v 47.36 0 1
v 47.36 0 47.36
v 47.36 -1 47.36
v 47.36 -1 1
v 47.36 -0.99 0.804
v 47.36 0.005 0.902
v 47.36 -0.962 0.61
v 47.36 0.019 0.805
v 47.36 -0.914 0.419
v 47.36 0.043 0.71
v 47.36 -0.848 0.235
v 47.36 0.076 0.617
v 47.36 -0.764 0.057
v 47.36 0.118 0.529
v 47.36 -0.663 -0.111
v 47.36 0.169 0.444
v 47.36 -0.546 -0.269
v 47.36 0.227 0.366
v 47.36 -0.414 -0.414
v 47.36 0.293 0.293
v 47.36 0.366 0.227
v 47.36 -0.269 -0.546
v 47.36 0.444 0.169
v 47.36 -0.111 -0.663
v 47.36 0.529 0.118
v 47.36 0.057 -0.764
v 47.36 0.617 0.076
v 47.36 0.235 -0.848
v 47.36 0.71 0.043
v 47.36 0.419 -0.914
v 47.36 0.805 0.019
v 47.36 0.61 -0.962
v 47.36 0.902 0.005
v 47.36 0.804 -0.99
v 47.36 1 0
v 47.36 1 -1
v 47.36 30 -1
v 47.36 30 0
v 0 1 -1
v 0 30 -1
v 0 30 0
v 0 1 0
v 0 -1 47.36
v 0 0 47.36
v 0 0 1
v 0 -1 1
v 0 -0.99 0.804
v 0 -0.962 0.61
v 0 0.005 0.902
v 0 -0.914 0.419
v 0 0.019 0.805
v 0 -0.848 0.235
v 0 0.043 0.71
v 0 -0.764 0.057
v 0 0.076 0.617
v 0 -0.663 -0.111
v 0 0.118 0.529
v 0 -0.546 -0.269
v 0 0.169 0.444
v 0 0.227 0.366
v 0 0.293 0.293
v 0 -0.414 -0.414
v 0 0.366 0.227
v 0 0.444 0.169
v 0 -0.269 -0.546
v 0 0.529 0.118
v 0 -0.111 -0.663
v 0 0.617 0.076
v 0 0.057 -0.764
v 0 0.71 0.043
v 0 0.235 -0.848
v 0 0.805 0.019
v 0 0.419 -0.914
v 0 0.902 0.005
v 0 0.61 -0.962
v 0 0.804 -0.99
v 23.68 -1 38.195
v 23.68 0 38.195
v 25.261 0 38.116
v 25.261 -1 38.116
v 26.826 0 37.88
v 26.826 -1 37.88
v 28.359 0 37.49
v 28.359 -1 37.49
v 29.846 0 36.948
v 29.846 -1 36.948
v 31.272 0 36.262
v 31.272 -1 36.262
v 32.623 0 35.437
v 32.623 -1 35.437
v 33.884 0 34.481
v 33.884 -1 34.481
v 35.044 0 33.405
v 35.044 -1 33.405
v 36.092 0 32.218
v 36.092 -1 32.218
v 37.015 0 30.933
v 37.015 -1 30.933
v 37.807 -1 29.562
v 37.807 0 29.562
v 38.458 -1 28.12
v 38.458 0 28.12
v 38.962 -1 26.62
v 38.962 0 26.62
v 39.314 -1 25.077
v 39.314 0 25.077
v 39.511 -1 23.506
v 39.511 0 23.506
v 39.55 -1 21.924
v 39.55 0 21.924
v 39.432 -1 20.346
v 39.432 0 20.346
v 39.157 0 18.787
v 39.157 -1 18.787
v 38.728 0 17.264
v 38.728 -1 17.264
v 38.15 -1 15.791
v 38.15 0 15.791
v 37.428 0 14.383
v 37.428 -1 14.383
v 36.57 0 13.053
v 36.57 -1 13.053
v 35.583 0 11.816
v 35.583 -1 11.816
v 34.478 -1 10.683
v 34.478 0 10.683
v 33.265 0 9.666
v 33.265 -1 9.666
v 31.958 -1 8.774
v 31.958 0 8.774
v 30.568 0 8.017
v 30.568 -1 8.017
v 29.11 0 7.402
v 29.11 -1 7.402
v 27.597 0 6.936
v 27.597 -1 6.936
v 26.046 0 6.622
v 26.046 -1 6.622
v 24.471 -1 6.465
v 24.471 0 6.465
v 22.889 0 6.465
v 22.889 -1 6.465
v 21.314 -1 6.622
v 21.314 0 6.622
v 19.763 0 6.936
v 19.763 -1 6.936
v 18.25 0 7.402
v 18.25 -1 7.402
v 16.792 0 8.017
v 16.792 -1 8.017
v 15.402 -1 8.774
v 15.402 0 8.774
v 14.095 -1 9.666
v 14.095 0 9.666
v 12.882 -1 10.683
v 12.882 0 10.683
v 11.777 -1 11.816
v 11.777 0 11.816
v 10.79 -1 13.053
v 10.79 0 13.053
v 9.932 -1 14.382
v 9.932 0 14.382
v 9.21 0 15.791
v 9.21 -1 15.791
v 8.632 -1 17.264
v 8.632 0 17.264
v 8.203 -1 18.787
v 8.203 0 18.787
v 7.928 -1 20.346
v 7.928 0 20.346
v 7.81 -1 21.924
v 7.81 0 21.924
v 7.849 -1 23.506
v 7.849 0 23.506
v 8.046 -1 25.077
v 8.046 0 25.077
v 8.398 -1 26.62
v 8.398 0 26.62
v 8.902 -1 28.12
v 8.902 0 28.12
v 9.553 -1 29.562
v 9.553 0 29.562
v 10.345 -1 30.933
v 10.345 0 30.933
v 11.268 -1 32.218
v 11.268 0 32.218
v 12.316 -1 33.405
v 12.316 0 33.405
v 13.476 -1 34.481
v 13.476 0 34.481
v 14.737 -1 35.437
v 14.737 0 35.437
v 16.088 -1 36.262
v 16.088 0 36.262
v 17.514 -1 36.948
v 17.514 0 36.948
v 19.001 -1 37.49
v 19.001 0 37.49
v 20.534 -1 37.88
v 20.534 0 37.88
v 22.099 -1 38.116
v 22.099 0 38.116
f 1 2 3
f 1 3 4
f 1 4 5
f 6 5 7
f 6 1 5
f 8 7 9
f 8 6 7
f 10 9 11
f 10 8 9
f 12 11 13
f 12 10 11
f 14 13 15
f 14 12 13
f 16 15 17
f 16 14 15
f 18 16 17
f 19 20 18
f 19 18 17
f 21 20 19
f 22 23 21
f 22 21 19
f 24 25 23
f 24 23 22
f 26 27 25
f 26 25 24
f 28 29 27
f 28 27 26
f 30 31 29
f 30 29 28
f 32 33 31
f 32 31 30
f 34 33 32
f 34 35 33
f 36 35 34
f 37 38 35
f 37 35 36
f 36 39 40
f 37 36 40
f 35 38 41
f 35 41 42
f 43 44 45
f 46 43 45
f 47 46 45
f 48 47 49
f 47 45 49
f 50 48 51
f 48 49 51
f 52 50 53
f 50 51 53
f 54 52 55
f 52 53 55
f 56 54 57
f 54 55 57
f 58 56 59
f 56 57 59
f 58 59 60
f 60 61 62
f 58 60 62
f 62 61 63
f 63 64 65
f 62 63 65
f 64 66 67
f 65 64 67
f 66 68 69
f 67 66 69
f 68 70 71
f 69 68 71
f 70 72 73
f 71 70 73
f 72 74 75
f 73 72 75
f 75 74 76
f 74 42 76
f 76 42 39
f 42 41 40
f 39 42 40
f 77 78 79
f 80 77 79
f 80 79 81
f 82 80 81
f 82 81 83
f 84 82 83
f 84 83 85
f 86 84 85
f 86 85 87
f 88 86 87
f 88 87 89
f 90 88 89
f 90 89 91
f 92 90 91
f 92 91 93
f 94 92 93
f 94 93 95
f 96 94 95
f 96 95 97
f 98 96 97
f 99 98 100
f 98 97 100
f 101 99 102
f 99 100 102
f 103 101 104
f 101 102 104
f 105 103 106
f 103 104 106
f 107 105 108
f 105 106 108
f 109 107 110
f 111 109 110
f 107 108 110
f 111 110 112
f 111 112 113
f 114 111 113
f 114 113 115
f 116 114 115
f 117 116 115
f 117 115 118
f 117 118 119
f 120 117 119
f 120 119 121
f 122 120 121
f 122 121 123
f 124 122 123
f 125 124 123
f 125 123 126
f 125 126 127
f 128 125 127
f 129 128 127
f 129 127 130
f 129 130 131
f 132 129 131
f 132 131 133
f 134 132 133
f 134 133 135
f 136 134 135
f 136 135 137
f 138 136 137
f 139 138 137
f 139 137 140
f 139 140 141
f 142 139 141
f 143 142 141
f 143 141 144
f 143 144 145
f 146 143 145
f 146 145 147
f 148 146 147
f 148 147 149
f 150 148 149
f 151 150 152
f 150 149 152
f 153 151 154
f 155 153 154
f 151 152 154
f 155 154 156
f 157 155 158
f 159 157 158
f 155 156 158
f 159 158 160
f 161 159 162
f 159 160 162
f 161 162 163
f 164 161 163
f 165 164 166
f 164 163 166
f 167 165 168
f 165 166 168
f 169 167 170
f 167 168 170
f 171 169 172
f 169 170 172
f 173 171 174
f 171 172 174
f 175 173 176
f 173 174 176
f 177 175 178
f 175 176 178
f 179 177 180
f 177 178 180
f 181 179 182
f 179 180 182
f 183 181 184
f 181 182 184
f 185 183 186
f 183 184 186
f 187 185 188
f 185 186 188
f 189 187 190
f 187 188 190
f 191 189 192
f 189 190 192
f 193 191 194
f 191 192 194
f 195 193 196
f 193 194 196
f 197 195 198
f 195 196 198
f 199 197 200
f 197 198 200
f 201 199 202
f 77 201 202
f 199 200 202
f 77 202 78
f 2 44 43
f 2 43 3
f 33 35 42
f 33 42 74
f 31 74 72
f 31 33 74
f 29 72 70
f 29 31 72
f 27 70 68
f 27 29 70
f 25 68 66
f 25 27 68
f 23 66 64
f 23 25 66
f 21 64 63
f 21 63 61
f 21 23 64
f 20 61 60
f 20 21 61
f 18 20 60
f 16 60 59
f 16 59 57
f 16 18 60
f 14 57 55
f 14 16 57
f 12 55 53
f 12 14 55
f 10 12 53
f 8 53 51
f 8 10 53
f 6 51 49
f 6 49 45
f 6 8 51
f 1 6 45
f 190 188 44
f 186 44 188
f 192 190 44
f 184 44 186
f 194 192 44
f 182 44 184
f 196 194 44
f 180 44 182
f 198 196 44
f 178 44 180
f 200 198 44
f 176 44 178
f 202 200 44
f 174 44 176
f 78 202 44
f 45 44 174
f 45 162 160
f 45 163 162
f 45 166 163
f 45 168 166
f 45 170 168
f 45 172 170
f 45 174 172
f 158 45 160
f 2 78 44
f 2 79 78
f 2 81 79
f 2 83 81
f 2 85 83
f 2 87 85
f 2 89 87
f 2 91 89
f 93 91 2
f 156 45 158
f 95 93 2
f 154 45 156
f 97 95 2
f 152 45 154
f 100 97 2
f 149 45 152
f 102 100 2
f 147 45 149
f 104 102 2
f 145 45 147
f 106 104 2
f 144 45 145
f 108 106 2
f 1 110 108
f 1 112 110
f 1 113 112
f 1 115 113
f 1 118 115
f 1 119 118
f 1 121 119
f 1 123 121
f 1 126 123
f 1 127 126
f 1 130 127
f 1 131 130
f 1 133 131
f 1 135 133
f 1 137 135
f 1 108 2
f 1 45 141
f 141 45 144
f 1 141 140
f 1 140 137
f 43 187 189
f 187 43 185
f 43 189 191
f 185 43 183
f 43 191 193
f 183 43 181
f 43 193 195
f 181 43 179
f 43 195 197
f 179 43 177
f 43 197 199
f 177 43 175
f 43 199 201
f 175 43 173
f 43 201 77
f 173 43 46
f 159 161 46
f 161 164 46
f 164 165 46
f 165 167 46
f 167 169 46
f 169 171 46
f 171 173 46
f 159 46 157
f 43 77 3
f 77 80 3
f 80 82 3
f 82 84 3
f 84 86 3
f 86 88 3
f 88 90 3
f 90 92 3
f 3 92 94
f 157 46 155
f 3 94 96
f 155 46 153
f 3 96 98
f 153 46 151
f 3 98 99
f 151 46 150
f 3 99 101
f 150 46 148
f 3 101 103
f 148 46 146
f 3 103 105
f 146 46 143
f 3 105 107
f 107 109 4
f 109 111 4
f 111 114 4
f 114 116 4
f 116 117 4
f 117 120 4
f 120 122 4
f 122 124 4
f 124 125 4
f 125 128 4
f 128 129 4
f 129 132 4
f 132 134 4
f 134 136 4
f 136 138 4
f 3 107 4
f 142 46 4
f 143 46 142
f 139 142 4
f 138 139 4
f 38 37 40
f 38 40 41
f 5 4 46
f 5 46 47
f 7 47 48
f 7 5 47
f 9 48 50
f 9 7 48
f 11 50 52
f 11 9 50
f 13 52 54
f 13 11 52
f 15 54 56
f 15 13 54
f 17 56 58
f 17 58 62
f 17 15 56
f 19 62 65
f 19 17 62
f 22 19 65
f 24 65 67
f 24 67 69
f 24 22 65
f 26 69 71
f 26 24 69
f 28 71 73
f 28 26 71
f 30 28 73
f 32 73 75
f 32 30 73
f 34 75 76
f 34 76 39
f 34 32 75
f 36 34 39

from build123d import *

# Parameters (mm, degrees)
SKETCH10_W                   = 47.36
SKETCH10_H                   = 47.36
BASE_FLANGE1_DEPTH           = 1
EDGE_FLANGE1_STRIP_W         = 6
EDGE_FLANGE1_STRIP_H         = 1
EDGE_FLANGE1_STRIP_CUT_DEPTH = 47.36
EDGE_FLANGE1_DEPTH           = 47.36
SKETCH20_R                   = 15.875
CUT_EXTRUDE1_DEPTH           = 74.388958298


# Sheet-metal steps are written as plain solids
with BuildPart() as part:
    # Sketch10 → Base-Flange1 (new body)
    with BuildSketch(Plane(origin=(0, 0, 0), x_dir=(1, 0, 0), z_dir=(0, 1, 0))):
        with Locations((23.68, -23.68)):
            Rectangle(SKETCH10_W, SKETCH10_H)
    extrude(amount=-BASE_FLANGE1_DEPTH)

    # Edge-Flange1 strip (across the edge) → Edge-Flange1 strip cut (cut)
    with BuildSketch(Plane.ZY.offset(-47.36)):
        with Locations((-2, -0.5)):
            Rectangle(EDGE_FLANGE1_STRIP_W, EDGE_FLANGE1_STRIP_H)
    extrude(amount=EDGE_FLANGE1_STRIP_CUT_DEPTH, mode=Mode.SUBTRACT)

    # Edge-Flange1 section (across the edge) → Edge-Flange1 (add)
    with BuildSketch(Plane.ZY.offset(-47.36)):
        with BuildLine():
            Line((-1, 1), (-1, 30))
            Line((-1, 30), (0, 30))
            Line((0, 30), (0, 1))
            ThreePointArc((0, 1), (0.292893219, 0.292893219), (1, 0))
            Line((1, 0), (1, -1))
            ThreePointArc((1, -1), (-0.414213562, -0.414213562), (-1, 1))
        make_face()
    extrude(amount=EDGE_FLANGE1_DEPTH)

    # Sketch20 → Cut-Extrude1 (cut, through all)
    with BuildSketch(Plane(origin=(0, 0, 0), x_dir=(1, 0, 0), z_dir=(0, 1, 0))):
        with Locations(Location((23.68, -22.32, 0), (0, 0, 270))):
            Circle(SKETCH20_R)
    extrude(amount=-CUT_EXTRUDE1_DEPTH, mode=Mode.SUBTRACT)


solid = part.part
